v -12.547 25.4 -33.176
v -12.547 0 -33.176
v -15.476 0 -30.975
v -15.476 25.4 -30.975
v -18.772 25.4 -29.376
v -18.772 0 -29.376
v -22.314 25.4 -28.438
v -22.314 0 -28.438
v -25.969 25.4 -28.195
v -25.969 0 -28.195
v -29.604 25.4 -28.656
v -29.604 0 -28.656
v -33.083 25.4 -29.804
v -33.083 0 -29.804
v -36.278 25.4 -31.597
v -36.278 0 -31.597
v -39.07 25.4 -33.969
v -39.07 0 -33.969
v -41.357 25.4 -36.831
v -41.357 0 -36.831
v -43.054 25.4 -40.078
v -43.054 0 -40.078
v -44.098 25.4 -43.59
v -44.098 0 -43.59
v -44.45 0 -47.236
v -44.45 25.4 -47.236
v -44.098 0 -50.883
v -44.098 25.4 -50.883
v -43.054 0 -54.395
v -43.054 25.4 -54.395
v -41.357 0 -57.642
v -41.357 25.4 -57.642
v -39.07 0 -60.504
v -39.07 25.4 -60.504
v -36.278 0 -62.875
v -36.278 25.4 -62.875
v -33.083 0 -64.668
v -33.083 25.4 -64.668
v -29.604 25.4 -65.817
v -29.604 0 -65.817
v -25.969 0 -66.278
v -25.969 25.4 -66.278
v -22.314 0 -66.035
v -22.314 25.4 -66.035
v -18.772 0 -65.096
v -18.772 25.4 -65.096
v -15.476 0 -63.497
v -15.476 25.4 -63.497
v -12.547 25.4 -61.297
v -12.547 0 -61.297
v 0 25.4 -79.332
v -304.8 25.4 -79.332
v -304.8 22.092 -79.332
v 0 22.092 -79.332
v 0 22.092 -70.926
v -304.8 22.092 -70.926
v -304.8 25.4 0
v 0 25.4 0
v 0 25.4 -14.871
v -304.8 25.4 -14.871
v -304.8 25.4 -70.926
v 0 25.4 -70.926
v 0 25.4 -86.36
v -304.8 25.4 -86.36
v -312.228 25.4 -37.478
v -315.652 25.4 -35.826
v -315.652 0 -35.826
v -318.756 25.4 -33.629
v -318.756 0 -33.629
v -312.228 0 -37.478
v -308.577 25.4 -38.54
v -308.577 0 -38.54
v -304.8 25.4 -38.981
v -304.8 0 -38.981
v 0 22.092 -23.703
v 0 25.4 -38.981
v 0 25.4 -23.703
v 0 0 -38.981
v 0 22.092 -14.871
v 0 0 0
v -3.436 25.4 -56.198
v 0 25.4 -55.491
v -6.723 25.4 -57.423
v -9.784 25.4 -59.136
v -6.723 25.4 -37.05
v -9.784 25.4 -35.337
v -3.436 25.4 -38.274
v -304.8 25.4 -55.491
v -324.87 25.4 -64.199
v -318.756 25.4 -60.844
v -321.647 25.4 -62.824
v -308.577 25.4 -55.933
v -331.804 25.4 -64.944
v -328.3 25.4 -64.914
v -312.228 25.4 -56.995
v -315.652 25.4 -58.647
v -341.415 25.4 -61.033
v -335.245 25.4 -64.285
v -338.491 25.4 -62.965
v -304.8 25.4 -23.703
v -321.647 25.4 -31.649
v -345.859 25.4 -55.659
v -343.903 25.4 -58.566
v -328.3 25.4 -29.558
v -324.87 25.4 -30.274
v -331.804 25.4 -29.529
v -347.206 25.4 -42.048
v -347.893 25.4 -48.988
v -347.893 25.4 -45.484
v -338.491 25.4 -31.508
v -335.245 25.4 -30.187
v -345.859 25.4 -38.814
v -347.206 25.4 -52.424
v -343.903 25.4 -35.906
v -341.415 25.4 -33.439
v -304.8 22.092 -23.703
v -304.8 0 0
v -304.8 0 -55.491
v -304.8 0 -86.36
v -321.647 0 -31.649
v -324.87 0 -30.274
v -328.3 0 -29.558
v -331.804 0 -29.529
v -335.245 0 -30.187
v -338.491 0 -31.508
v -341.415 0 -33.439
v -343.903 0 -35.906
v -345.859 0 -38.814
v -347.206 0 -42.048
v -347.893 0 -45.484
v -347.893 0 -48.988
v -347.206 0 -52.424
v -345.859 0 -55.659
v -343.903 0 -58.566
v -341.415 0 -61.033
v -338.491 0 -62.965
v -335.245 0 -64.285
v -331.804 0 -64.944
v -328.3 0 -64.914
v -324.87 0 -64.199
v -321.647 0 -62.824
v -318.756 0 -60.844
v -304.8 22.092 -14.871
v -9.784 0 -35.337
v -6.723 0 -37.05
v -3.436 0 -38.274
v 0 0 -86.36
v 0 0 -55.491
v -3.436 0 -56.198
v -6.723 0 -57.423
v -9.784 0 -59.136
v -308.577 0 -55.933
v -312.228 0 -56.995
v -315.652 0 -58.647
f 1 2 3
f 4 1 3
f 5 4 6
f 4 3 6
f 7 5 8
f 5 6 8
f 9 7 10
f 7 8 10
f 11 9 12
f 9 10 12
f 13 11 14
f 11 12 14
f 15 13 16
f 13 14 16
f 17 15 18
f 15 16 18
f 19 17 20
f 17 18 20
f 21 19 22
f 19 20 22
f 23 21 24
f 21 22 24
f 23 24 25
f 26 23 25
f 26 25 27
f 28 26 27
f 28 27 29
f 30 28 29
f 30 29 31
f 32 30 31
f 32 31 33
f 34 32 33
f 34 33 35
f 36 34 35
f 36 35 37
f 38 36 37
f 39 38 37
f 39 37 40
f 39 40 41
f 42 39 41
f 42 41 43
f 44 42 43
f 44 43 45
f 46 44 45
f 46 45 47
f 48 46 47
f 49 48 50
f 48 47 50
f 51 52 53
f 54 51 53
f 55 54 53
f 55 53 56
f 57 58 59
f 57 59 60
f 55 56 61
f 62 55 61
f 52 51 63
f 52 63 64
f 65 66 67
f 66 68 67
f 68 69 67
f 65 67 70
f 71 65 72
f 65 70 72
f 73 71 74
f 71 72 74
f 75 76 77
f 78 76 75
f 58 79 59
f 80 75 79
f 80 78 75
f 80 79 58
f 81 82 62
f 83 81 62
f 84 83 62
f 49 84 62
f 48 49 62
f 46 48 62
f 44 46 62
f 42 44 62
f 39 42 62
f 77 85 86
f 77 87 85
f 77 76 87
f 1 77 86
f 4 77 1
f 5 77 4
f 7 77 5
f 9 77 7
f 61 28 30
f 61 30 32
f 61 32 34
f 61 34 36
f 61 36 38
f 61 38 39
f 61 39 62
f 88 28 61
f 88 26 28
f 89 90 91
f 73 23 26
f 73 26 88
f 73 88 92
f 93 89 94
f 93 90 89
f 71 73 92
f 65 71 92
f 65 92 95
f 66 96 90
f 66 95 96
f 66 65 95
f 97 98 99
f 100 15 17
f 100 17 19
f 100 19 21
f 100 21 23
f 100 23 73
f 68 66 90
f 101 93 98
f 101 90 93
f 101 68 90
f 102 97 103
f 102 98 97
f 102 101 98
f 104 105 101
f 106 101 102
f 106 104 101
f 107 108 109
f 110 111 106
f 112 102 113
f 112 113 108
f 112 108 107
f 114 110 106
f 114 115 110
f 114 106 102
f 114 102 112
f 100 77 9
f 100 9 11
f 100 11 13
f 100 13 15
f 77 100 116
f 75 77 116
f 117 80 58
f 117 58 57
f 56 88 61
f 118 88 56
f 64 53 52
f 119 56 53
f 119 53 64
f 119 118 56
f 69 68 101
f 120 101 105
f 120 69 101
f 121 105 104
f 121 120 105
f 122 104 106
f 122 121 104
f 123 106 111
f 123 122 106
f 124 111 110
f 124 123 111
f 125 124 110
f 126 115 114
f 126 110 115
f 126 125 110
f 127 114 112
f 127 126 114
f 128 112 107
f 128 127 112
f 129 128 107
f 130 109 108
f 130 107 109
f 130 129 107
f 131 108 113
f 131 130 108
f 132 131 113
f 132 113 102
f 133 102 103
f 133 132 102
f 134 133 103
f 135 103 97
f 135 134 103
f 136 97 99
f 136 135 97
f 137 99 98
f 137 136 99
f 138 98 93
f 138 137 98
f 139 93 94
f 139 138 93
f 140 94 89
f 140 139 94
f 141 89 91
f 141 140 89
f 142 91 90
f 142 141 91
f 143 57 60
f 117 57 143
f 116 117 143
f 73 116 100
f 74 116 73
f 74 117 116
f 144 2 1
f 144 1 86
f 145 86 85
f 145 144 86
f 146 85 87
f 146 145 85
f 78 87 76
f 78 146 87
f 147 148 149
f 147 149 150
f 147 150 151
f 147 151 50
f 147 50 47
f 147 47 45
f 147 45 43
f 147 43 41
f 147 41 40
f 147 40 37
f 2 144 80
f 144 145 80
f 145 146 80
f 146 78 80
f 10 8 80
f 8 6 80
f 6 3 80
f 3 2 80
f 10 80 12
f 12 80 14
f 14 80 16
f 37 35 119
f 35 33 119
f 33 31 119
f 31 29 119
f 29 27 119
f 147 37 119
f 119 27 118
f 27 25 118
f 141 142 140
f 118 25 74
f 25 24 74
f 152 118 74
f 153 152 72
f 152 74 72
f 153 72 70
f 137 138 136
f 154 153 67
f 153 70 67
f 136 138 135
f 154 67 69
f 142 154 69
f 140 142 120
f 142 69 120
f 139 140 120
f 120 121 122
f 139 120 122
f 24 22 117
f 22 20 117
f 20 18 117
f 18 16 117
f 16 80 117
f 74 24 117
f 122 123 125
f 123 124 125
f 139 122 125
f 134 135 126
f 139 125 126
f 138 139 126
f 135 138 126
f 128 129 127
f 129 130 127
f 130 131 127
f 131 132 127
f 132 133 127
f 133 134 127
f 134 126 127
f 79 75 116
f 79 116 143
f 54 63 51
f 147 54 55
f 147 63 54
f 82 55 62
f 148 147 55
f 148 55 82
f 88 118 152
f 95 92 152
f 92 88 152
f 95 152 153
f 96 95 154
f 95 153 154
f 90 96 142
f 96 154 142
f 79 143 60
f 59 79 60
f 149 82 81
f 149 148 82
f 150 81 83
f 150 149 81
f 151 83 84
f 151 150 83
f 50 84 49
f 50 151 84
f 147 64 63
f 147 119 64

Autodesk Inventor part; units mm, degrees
ref_plane "YZ Plane" through (0, 0, 0) normal (1, 0, 0) x (0, 1, 0)
ref_plane "XZ Plane" through (0, 0, 0) normal (0, 1, 0) x (-1, 0, 0)
ref_plane "XY Plane" through (0, 0, 0) normal (0, 0, 1) x (1, 0, 0)
sketch "Sketch1" plane through (0, 0, 0) normal (0, 1, 0) x (-1, 0, 0)
  line L0 (0, 0) -> (304.8, 0)
  line L1 (304.8, 0) -> (304.8, -86.36)
  line L2 (304.8, -86.36) -> (0, -86.36)
  line L3 (0, -86.36) -> (0, 0)
  circle A0 centre (25.4, -47.2363) radius 19.05
  circle A1 centre (330.2, -47.2363) radius 17.78
  line L4 (34.5288, -55.4913) -> (0, -55.4913)
  line L5 (34.5288, -38.9813) -> (0, -38.9813)
  line L6 (34.5288, -38.9813) -> (34.5288, -55.4913)
  line L7 (0, -38.9813) -> (0, -55.4913)
  line L8 (331.681, -55.4913) -> (282.1836, -55.4913)
  line L9 (331.681, -38.9813) -> (282.1836, -38.9813)
  line L10 (331.681, -38.9813) -> (331.681, -55.4913)
  line L11 (282.1836, -38.9813) -> (282.1836, -55.4913)
  dimension "d0" = 304.8
  dimension "d1" = 86.36
extrude "Extrusion1" add sketch "Sketch1" along normal blind 25.4
extrude "Extrusion2" cut sketch "Sketch1" along normal blind 25.4 contours L5 A0 L4 L3 | L5 L6 L4 A0 | A0 L4 L6 L5
fillet "Fillet1" radius 22.86 4 edges at (-8.2315, 12.7, -55.4913) (-8.2315, 12.7, -38.9813) (-314.4525, 12.7, -38.9813) (-314.4525, 12.7, -55.4913)
sketch "Sketch2" plane through (0, 0, 0) normal (1, 0, 0) x (0, 0, -1)
  line L0 (38.9813, 25.4) -> (0, 25.4) projected
  line L1 (14.8709, 25.4) -> (23.7033, 25.4)
  line L2 (23.7033, 25.4) -> (23.7033, 22.0925)
  line L3 (23.7033, 22.0925) -> (14.8709, 22.0925)
  line L4 (14.8709, 22.0925) -> (14.8709, 25.4)
  line L5 (86.36, 25.4) -> (55.4913, 25.4) projected
  line L6 (70.9256, 25.4) -> (79.3317, 25.4)
  line L7 (79.3317, 25.4) -> (79.3317, 22.0925)
  line L8 (79.3317, 22.0925) -> (70.9256, 22.0925)
  line L9 (70.9256, 22.0925) -> (70.9256, 25.4)
  point P0 (0, 0)
extrude "Extrusion3" cut sketch "Sketch2" against normal blind 379.4125
properties part number "train track"
